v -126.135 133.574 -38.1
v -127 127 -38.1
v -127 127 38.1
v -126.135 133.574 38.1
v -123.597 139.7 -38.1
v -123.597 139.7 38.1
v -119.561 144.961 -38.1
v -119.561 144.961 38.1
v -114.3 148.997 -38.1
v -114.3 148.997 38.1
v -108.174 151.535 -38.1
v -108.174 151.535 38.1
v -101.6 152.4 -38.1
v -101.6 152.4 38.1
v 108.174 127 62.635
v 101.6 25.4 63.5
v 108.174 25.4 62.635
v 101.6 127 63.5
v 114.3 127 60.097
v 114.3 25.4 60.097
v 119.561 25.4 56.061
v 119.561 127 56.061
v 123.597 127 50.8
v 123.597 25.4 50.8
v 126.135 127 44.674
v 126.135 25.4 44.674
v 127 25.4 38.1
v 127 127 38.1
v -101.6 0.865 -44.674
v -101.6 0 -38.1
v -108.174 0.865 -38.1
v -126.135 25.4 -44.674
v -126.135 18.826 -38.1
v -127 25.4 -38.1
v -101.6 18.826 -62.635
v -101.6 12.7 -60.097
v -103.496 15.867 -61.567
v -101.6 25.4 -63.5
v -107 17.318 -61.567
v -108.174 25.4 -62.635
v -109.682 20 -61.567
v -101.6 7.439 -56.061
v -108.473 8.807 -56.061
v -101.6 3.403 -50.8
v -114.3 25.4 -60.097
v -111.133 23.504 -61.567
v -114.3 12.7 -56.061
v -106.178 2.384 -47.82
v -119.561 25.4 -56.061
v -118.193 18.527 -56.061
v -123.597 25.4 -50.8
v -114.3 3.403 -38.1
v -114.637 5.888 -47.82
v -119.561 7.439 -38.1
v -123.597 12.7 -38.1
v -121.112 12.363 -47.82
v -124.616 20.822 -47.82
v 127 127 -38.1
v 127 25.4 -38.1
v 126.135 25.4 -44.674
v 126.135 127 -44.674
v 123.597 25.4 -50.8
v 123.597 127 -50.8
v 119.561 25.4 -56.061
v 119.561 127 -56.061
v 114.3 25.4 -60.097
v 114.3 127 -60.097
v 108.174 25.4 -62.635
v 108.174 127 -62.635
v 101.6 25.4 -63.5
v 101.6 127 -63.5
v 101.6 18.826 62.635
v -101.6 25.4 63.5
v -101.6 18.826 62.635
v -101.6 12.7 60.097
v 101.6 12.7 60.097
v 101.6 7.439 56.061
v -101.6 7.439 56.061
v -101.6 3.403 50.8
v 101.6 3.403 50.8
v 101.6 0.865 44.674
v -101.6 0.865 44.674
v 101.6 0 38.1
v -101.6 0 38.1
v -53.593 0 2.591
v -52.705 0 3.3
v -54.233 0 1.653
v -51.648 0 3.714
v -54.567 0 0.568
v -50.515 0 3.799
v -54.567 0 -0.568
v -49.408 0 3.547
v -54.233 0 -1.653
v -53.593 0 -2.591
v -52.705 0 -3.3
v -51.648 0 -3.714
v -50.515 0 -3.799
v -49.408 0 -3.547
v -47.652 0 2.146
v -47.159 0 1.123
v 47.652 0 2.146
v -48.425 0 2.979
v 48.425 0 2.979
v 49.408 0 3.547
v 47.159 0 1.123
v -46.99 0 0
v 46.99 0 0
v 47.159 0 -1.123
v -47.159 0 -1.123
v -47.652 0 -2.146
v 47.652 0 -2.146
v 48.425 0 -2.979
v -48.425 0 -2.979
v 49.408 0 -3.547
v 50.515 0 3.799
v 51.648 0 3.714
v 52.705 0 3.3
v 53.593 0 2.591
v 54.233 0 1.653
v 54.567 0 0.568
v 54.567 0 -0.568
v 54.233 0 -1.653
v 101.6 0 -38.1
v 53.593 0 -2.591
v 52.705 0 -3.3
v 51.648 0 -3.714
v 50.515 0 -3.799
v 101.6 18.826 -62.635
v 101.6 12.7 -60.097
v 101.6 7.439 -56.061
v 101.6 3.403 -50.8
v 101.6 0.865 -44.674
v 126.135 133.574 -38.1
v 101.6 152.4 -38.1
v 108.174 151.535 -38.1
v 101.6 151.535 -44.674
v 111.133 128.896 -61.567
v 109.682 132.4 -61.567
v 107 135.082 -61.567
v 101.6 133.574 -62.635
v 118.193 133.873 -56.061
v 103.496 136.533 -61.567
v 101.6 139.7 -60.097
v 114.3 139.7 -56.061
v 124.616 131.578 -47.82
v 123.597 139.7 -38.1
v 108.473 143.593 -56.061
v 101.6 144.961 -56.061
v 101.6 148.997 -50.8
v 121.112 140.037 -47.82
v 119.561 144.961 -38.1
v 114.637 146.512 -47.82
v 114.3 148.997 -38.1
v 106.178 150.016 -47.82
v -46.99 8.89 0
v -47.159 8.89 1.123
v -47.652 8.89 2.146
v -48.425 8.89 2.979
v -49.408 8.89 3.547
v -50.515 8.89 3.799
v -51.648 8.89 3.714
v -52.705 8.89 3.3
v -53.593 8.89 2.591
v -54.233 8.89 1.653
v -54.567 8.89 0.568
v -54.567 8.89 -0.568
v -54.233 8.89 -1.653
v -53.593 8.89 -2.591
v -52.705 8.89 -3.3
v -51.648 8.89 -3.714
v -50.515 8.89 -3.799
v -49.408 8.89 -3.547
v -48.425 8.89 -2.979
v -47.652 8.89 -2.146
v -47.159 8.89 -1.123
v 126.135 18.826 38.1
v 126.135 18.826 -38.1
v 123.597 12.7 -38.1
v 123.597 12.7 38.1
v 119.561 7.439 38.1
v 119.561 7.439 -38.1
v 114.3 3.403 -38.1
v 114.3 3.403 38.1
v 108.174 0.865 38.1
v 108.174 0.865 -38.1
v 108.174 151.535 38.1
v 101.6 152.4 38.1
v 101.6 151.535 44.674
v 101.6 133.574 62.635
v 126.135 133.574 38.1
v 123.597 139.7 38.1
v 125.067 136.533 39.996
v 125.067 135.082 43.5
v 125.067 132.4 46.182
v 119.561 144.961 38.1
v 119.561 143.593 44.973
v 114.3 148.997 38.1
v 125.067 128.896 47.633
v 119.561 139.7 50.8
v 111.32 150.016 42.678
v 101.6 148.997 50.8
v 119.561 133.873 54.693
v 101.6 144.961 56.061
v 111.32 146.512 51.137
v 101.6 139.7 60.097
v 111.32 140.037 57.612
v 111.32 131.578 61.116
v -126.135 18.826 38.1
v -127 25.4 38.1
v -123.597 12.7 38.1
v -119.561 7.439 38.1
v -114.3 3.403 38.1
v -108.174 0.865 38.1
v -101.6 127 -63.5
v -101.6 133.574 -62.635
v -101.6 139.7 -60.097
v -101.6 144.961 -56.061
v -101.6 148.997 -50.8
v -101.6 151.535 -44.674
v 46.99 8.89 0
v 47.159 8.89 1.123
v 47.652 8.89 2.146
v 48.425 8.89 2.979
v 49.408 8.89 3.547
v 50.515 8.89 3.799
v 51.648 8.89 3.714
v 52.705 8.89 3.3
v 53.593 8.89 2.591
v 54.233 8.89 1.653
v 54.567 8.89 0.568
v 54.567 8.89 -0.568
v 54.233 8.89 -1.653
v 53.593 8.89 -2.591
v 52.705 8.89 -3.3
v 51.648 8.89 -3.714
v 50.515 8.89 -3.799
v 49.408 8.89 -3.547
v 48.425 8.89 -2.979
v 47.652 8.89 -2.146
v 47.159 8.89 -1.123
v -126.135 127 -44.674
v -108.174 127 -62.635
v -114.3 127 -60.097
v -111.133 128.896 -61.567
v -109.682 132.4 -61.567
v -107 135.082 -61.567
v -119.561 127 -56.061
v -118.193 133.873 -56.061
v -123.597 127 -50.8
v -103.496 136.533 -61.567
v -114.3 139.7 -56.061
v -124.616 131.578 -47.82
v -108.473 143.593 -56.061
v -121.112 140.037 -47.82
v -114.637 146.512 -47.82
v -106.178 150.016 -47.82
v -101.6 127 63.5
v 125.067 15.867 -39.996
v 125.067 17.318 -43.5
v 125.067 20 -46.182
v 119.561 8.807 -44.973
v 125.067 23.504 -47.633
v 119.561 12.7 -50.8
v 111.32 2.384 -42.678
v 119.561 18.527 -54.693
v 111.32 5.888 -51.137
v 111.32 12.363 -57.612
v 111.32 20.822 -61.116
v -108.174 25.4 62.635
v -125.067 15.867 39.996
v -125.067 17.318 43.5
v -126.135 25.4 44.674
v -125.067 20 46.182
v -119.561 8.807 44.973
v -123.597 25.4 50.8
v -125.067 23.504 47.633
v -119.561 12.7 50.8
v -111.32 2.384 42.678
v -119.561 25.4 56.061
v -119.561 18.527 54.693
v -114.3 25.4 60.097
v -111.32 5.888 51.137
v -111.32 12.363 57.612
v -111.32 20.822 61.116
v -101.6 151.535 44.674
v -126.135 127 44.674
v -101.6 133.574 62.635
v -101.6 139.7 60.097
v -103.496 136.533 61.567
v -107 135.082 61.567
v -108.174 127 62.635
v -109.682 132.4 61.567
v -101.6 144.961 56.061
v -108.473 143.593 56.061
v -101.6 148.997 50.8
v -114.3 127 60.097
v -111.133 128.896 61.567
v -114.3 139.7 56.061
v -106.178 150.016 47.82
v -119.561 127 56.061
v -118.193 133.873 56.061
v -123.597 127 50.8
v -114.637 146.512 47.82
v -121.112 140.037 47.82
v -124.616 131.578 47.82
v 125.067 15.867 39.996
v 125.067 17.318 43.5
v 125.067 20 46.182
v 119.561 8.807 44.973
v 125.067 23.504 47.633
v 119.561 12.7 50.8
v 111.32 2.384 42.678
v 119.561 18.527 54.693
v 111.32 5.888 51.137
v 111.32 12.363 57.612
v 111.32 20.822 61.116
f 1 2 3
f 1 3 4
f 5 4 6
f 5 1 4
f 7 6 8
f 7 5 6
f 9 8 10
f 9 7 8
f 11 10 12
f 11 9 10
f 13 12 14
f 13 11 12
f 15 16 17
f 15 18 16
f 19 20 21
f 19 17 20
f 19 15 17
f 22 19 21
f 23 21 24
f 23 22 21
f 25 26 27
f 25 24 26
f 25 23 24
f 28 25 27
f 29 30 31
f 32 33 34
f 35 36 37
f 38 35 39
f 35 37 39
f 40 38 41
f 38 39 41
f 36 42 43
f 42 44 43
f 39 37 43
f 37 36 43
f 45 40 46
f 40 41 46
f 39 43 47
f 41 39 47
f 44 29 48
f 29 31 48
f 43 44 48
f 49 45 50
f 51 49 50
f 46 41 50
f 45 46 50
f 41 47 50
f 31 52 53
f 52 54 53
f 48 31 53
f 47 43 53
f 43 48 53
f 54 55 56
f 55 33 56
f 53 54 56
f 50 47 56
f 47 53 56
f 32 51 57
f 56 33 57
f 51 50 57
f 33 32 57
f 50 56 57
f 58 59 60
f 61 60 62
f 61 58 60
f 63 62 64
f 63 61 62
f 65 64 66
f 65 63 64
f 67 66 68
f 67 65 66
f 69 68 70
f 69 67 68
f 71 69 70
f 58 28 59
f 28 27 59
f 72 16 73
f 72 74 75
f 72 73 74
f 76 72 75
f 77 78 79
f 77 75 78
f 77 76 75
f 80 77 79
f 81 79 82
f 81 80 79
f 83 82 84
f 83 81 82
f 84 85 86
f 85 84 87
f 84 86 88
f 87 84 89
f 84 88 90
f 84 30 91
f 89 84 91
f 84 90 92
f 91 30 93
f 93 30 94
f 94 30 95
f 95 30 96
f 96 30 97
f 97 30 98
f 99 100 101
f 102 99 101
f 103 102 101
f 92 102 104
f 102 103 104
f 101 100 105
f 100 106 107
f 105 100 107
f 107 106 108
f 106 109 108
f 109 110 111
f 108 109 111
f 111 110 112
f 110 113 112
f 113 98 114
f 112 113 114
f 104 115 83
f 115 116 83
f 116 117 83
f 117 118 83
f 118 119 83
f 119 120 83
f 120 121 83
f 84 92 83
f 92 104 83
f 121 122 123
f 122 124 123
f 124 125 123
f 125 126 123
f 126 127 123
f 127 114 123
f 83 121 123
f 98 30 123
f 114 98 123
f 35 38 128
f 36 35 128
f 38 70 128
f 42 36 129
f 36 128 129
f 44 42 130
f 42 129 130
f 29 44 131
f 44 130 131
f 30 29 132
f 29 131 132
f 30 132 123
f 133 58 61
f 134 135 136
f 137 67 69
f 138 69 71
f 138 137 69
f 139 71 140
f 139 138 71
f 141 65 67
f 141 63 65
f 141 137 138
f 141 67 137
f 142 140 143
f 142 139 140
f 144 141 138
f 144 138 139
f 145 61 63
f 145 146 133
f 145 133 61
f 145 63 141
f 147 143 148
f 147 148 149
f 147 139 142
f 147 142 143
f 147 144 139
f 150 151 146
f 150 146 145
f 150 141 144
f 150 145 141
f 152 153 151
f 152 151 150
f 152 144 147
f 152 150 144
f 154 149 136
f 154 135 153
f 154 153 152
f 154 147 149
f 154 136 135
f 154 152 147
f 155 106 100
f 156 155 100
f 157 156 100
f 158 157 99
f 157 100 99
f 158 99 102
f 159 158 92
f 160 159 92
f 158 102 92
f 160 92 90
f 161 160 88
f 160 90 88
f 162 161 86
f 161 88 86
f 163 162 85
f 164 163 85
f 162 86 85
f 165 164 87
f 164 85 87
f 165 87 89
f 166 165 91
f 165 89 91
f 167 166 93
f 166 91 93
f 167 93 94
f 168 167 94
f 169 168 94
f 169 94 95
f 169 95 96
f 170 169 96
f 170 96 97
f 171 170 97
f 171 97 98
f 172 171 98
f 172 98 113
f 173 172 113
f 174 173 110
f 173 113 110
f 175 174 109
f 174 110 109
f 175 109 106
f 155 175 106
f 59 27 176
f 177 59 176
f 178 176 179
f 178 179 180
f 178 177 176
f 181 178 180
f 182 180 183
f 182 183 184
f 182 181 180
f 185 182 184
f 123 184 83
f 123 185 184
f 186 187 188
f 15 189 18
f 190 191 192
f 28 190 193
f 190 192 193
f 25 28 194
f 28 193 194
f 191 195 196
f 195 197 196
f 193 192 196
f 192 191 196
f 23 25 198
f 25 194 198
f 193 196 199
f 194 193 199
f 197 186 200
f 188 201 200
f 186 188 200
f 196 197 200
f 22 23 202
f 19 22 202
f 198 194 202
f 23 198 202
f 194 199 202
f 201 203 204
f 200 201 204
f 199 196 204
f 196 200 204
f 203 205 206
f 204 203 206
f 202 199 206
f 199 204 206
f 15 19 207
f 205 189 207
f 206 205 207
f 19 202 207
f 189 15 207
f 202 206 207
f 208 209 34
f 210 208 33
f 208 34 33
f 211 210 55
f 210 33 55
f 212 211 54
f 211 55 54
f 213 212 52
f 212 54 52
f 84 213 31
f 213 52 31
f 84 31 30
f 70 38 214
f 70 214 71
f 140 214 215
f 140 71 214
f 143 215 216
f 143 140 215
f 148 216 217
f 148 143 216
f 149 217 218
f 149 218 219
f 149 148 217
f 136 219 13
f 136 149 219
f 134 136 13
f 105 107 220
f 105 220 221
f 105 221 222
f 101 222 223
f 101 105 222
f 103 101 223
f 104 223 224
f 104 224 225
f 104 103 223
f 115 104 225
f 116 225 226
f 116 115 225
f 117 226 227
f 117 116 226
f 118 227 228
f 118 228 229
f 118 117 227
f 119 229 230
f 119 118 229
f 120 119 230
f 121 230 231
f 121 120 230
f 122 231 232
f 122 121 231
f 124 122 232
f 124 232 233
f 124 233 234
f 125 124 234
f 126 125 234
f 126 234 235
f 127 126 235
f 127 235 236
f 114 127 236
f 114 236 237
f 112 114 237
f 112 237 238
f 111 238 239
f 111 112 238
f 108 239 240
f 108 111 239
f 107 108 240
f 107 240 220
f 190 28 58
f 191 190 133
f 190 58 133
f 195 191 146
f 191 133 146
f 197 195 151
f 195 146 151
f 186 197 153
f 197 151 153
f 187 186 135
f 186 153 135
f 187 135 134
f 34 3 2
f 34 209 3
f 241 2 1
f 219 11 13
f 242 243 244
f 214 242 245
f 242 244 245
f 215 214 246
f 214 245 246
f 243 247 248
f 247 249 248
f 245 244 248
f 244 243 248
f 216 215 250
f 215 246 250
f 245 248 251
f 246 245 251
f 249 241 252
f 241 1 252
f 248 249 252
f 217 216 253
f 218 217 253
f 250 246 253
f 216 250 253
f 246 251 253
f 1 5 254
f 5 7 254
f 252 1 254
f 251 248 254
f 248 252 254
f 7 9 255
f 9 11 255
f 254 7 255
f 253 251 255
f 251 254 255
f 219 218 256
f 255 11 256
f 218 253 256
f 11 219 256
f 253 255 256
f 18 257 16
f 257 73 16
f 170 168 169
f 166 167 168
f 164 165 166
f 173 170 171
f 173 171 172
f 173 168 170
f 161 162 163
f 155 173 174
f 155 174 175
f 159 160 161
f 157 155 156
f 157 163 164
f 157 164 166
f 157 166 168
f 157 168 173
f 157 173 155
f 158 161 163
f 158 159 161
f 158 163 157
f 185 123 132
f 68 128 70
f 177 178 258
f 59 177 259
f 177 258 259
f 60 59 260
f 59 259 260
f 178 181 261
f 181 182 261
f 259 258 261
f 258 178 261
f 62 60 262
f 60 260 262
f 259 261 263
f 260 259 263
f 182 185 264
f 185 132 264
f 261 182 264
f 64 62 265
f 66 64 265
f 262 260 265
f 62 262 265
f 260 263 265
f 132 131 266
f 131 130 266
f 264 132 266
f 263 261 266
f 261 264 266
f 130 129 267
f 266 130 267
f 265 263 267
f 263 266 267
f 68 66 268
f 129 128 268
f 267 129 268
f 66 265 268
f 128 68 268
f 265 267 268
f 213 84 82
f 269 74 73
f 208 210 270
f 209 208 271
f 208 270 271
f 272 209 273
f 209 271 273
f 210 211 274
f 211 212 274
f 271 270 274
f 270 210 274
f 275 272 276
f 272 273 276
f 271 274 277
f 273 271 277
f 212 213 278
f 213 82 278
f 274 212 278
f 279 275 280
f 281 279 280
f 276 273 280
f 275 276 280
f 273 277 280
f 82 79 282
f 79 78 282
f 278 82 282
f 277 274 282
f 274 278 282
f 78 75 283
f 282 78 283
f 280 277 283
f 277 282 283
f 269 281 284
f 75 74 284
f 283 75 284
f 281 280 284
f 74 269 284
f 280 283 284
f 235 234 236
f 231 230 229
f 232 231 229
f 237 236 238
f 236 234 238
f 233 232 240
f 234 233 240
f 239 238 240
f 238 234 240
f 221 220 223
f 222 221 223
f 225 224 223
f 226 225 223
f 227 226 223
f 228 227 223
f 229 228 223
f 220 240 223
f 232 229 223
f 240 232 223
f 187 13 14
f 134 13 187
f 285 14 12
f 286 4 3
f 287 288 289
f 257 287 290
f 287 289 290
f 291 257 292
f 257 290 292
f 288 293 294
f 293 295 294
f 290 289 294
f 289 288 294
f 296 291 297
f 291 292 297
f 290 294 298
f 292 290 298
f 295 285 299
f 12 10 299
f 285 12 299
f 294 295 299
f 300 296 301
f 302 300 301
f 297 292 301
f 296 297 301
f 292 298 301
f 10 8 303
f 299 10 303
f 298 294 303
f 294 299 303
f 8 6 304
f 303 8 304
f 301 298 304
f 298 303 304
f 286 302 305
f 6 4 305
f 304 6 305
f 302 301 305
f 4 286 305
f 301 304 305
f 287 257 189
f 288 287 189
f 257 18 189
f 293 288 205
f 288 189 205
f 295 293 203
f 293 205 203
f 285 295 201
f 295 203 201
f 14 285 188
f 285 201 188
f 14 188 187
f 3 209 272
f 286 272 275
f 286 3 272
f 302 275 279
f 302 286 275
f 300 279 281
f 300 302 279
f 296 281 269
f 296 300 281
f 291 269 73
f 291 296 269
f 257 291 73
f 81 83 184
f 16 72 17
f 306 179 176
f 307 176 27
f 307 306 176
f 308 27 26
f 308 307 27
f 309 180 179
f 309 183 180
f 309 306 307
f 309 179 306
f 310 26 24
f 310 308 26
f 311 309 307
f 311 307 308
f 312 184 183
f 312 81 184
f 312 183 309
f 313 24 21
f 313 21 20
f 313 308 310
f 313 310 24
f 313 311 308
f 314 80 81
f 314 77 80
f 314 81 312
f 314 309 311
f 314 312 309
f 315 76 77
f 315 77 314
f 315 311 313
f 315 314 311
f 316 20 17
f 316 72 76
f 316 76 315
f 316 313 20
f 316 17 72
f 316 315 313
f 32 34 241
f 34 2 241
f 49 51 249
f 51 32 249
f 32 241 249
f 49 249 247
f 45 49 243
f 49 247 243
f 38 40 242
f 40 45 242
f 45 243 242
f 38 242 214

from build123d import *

# Parameters (mm, degrees)
SKETCH1_W           = 254
SKETCH1_H           = 127
BOSS_EXTRUDE1_DEPTH = 152.4
FILLET1_R           = 25.4
SKETCH3_R           = 3.81
CUT_EXTRUDE1_DEPTH  = 8.89


with BuildPart() as part:
    # Sketch1 → Boss-Extrude1 (new body)
    with BuildSketch(Plane(origin=(0, 0, 0), x_dir=(1, 0, 0), z_dir=(0, 1, 0))):
        Rectangle(SKETCH1_W, SKETCH1_H)
    extrude(amount=BOSS_EXTRUDE1_DEPTH)

    # Fillet1
    fillet1_edges = [part.edges().sort_by_distance(p)[0] for p in [
        (-127, 152.4, 0),
        (0, 152.4, 63.5),
        (127, 152.4, 0),
        (0, 0, 63.5),
        (-127, 0, 0),
        (0, 0, -63.5),
        (127, 0, 0),
        (127, 76.2, 63.5),
        (-127, 76.2, 63.5),
        (-127, 76.2, -63.5),
        (127, 76.2, -63.5),
        (0, 152.4, -63.5),
    ]]
    fillet(fillet1_edges, radius=FILLET1_R)

    # Sketch3 → Cut-Extrude1 (cut)
    with BuildSketch(Plane.XZ):
        with Locations((-50.8, 0)):
            Circle(SKETCH3_R)
    cut_extrude1 = extrude(amount=-CUT_EXTRUDE1_DEPTH, mode=Mode.SUBTRACT)

    # Mirror1: Cut-Extrude1 across plane
    add(cut_extrude1.mirror(Plane(origin=(0, 0, 0), x_dir=(0, 0, 1), z_dir=(1, 0, 0))), mode=Mode.SUBTRACT)


solid = part.part
